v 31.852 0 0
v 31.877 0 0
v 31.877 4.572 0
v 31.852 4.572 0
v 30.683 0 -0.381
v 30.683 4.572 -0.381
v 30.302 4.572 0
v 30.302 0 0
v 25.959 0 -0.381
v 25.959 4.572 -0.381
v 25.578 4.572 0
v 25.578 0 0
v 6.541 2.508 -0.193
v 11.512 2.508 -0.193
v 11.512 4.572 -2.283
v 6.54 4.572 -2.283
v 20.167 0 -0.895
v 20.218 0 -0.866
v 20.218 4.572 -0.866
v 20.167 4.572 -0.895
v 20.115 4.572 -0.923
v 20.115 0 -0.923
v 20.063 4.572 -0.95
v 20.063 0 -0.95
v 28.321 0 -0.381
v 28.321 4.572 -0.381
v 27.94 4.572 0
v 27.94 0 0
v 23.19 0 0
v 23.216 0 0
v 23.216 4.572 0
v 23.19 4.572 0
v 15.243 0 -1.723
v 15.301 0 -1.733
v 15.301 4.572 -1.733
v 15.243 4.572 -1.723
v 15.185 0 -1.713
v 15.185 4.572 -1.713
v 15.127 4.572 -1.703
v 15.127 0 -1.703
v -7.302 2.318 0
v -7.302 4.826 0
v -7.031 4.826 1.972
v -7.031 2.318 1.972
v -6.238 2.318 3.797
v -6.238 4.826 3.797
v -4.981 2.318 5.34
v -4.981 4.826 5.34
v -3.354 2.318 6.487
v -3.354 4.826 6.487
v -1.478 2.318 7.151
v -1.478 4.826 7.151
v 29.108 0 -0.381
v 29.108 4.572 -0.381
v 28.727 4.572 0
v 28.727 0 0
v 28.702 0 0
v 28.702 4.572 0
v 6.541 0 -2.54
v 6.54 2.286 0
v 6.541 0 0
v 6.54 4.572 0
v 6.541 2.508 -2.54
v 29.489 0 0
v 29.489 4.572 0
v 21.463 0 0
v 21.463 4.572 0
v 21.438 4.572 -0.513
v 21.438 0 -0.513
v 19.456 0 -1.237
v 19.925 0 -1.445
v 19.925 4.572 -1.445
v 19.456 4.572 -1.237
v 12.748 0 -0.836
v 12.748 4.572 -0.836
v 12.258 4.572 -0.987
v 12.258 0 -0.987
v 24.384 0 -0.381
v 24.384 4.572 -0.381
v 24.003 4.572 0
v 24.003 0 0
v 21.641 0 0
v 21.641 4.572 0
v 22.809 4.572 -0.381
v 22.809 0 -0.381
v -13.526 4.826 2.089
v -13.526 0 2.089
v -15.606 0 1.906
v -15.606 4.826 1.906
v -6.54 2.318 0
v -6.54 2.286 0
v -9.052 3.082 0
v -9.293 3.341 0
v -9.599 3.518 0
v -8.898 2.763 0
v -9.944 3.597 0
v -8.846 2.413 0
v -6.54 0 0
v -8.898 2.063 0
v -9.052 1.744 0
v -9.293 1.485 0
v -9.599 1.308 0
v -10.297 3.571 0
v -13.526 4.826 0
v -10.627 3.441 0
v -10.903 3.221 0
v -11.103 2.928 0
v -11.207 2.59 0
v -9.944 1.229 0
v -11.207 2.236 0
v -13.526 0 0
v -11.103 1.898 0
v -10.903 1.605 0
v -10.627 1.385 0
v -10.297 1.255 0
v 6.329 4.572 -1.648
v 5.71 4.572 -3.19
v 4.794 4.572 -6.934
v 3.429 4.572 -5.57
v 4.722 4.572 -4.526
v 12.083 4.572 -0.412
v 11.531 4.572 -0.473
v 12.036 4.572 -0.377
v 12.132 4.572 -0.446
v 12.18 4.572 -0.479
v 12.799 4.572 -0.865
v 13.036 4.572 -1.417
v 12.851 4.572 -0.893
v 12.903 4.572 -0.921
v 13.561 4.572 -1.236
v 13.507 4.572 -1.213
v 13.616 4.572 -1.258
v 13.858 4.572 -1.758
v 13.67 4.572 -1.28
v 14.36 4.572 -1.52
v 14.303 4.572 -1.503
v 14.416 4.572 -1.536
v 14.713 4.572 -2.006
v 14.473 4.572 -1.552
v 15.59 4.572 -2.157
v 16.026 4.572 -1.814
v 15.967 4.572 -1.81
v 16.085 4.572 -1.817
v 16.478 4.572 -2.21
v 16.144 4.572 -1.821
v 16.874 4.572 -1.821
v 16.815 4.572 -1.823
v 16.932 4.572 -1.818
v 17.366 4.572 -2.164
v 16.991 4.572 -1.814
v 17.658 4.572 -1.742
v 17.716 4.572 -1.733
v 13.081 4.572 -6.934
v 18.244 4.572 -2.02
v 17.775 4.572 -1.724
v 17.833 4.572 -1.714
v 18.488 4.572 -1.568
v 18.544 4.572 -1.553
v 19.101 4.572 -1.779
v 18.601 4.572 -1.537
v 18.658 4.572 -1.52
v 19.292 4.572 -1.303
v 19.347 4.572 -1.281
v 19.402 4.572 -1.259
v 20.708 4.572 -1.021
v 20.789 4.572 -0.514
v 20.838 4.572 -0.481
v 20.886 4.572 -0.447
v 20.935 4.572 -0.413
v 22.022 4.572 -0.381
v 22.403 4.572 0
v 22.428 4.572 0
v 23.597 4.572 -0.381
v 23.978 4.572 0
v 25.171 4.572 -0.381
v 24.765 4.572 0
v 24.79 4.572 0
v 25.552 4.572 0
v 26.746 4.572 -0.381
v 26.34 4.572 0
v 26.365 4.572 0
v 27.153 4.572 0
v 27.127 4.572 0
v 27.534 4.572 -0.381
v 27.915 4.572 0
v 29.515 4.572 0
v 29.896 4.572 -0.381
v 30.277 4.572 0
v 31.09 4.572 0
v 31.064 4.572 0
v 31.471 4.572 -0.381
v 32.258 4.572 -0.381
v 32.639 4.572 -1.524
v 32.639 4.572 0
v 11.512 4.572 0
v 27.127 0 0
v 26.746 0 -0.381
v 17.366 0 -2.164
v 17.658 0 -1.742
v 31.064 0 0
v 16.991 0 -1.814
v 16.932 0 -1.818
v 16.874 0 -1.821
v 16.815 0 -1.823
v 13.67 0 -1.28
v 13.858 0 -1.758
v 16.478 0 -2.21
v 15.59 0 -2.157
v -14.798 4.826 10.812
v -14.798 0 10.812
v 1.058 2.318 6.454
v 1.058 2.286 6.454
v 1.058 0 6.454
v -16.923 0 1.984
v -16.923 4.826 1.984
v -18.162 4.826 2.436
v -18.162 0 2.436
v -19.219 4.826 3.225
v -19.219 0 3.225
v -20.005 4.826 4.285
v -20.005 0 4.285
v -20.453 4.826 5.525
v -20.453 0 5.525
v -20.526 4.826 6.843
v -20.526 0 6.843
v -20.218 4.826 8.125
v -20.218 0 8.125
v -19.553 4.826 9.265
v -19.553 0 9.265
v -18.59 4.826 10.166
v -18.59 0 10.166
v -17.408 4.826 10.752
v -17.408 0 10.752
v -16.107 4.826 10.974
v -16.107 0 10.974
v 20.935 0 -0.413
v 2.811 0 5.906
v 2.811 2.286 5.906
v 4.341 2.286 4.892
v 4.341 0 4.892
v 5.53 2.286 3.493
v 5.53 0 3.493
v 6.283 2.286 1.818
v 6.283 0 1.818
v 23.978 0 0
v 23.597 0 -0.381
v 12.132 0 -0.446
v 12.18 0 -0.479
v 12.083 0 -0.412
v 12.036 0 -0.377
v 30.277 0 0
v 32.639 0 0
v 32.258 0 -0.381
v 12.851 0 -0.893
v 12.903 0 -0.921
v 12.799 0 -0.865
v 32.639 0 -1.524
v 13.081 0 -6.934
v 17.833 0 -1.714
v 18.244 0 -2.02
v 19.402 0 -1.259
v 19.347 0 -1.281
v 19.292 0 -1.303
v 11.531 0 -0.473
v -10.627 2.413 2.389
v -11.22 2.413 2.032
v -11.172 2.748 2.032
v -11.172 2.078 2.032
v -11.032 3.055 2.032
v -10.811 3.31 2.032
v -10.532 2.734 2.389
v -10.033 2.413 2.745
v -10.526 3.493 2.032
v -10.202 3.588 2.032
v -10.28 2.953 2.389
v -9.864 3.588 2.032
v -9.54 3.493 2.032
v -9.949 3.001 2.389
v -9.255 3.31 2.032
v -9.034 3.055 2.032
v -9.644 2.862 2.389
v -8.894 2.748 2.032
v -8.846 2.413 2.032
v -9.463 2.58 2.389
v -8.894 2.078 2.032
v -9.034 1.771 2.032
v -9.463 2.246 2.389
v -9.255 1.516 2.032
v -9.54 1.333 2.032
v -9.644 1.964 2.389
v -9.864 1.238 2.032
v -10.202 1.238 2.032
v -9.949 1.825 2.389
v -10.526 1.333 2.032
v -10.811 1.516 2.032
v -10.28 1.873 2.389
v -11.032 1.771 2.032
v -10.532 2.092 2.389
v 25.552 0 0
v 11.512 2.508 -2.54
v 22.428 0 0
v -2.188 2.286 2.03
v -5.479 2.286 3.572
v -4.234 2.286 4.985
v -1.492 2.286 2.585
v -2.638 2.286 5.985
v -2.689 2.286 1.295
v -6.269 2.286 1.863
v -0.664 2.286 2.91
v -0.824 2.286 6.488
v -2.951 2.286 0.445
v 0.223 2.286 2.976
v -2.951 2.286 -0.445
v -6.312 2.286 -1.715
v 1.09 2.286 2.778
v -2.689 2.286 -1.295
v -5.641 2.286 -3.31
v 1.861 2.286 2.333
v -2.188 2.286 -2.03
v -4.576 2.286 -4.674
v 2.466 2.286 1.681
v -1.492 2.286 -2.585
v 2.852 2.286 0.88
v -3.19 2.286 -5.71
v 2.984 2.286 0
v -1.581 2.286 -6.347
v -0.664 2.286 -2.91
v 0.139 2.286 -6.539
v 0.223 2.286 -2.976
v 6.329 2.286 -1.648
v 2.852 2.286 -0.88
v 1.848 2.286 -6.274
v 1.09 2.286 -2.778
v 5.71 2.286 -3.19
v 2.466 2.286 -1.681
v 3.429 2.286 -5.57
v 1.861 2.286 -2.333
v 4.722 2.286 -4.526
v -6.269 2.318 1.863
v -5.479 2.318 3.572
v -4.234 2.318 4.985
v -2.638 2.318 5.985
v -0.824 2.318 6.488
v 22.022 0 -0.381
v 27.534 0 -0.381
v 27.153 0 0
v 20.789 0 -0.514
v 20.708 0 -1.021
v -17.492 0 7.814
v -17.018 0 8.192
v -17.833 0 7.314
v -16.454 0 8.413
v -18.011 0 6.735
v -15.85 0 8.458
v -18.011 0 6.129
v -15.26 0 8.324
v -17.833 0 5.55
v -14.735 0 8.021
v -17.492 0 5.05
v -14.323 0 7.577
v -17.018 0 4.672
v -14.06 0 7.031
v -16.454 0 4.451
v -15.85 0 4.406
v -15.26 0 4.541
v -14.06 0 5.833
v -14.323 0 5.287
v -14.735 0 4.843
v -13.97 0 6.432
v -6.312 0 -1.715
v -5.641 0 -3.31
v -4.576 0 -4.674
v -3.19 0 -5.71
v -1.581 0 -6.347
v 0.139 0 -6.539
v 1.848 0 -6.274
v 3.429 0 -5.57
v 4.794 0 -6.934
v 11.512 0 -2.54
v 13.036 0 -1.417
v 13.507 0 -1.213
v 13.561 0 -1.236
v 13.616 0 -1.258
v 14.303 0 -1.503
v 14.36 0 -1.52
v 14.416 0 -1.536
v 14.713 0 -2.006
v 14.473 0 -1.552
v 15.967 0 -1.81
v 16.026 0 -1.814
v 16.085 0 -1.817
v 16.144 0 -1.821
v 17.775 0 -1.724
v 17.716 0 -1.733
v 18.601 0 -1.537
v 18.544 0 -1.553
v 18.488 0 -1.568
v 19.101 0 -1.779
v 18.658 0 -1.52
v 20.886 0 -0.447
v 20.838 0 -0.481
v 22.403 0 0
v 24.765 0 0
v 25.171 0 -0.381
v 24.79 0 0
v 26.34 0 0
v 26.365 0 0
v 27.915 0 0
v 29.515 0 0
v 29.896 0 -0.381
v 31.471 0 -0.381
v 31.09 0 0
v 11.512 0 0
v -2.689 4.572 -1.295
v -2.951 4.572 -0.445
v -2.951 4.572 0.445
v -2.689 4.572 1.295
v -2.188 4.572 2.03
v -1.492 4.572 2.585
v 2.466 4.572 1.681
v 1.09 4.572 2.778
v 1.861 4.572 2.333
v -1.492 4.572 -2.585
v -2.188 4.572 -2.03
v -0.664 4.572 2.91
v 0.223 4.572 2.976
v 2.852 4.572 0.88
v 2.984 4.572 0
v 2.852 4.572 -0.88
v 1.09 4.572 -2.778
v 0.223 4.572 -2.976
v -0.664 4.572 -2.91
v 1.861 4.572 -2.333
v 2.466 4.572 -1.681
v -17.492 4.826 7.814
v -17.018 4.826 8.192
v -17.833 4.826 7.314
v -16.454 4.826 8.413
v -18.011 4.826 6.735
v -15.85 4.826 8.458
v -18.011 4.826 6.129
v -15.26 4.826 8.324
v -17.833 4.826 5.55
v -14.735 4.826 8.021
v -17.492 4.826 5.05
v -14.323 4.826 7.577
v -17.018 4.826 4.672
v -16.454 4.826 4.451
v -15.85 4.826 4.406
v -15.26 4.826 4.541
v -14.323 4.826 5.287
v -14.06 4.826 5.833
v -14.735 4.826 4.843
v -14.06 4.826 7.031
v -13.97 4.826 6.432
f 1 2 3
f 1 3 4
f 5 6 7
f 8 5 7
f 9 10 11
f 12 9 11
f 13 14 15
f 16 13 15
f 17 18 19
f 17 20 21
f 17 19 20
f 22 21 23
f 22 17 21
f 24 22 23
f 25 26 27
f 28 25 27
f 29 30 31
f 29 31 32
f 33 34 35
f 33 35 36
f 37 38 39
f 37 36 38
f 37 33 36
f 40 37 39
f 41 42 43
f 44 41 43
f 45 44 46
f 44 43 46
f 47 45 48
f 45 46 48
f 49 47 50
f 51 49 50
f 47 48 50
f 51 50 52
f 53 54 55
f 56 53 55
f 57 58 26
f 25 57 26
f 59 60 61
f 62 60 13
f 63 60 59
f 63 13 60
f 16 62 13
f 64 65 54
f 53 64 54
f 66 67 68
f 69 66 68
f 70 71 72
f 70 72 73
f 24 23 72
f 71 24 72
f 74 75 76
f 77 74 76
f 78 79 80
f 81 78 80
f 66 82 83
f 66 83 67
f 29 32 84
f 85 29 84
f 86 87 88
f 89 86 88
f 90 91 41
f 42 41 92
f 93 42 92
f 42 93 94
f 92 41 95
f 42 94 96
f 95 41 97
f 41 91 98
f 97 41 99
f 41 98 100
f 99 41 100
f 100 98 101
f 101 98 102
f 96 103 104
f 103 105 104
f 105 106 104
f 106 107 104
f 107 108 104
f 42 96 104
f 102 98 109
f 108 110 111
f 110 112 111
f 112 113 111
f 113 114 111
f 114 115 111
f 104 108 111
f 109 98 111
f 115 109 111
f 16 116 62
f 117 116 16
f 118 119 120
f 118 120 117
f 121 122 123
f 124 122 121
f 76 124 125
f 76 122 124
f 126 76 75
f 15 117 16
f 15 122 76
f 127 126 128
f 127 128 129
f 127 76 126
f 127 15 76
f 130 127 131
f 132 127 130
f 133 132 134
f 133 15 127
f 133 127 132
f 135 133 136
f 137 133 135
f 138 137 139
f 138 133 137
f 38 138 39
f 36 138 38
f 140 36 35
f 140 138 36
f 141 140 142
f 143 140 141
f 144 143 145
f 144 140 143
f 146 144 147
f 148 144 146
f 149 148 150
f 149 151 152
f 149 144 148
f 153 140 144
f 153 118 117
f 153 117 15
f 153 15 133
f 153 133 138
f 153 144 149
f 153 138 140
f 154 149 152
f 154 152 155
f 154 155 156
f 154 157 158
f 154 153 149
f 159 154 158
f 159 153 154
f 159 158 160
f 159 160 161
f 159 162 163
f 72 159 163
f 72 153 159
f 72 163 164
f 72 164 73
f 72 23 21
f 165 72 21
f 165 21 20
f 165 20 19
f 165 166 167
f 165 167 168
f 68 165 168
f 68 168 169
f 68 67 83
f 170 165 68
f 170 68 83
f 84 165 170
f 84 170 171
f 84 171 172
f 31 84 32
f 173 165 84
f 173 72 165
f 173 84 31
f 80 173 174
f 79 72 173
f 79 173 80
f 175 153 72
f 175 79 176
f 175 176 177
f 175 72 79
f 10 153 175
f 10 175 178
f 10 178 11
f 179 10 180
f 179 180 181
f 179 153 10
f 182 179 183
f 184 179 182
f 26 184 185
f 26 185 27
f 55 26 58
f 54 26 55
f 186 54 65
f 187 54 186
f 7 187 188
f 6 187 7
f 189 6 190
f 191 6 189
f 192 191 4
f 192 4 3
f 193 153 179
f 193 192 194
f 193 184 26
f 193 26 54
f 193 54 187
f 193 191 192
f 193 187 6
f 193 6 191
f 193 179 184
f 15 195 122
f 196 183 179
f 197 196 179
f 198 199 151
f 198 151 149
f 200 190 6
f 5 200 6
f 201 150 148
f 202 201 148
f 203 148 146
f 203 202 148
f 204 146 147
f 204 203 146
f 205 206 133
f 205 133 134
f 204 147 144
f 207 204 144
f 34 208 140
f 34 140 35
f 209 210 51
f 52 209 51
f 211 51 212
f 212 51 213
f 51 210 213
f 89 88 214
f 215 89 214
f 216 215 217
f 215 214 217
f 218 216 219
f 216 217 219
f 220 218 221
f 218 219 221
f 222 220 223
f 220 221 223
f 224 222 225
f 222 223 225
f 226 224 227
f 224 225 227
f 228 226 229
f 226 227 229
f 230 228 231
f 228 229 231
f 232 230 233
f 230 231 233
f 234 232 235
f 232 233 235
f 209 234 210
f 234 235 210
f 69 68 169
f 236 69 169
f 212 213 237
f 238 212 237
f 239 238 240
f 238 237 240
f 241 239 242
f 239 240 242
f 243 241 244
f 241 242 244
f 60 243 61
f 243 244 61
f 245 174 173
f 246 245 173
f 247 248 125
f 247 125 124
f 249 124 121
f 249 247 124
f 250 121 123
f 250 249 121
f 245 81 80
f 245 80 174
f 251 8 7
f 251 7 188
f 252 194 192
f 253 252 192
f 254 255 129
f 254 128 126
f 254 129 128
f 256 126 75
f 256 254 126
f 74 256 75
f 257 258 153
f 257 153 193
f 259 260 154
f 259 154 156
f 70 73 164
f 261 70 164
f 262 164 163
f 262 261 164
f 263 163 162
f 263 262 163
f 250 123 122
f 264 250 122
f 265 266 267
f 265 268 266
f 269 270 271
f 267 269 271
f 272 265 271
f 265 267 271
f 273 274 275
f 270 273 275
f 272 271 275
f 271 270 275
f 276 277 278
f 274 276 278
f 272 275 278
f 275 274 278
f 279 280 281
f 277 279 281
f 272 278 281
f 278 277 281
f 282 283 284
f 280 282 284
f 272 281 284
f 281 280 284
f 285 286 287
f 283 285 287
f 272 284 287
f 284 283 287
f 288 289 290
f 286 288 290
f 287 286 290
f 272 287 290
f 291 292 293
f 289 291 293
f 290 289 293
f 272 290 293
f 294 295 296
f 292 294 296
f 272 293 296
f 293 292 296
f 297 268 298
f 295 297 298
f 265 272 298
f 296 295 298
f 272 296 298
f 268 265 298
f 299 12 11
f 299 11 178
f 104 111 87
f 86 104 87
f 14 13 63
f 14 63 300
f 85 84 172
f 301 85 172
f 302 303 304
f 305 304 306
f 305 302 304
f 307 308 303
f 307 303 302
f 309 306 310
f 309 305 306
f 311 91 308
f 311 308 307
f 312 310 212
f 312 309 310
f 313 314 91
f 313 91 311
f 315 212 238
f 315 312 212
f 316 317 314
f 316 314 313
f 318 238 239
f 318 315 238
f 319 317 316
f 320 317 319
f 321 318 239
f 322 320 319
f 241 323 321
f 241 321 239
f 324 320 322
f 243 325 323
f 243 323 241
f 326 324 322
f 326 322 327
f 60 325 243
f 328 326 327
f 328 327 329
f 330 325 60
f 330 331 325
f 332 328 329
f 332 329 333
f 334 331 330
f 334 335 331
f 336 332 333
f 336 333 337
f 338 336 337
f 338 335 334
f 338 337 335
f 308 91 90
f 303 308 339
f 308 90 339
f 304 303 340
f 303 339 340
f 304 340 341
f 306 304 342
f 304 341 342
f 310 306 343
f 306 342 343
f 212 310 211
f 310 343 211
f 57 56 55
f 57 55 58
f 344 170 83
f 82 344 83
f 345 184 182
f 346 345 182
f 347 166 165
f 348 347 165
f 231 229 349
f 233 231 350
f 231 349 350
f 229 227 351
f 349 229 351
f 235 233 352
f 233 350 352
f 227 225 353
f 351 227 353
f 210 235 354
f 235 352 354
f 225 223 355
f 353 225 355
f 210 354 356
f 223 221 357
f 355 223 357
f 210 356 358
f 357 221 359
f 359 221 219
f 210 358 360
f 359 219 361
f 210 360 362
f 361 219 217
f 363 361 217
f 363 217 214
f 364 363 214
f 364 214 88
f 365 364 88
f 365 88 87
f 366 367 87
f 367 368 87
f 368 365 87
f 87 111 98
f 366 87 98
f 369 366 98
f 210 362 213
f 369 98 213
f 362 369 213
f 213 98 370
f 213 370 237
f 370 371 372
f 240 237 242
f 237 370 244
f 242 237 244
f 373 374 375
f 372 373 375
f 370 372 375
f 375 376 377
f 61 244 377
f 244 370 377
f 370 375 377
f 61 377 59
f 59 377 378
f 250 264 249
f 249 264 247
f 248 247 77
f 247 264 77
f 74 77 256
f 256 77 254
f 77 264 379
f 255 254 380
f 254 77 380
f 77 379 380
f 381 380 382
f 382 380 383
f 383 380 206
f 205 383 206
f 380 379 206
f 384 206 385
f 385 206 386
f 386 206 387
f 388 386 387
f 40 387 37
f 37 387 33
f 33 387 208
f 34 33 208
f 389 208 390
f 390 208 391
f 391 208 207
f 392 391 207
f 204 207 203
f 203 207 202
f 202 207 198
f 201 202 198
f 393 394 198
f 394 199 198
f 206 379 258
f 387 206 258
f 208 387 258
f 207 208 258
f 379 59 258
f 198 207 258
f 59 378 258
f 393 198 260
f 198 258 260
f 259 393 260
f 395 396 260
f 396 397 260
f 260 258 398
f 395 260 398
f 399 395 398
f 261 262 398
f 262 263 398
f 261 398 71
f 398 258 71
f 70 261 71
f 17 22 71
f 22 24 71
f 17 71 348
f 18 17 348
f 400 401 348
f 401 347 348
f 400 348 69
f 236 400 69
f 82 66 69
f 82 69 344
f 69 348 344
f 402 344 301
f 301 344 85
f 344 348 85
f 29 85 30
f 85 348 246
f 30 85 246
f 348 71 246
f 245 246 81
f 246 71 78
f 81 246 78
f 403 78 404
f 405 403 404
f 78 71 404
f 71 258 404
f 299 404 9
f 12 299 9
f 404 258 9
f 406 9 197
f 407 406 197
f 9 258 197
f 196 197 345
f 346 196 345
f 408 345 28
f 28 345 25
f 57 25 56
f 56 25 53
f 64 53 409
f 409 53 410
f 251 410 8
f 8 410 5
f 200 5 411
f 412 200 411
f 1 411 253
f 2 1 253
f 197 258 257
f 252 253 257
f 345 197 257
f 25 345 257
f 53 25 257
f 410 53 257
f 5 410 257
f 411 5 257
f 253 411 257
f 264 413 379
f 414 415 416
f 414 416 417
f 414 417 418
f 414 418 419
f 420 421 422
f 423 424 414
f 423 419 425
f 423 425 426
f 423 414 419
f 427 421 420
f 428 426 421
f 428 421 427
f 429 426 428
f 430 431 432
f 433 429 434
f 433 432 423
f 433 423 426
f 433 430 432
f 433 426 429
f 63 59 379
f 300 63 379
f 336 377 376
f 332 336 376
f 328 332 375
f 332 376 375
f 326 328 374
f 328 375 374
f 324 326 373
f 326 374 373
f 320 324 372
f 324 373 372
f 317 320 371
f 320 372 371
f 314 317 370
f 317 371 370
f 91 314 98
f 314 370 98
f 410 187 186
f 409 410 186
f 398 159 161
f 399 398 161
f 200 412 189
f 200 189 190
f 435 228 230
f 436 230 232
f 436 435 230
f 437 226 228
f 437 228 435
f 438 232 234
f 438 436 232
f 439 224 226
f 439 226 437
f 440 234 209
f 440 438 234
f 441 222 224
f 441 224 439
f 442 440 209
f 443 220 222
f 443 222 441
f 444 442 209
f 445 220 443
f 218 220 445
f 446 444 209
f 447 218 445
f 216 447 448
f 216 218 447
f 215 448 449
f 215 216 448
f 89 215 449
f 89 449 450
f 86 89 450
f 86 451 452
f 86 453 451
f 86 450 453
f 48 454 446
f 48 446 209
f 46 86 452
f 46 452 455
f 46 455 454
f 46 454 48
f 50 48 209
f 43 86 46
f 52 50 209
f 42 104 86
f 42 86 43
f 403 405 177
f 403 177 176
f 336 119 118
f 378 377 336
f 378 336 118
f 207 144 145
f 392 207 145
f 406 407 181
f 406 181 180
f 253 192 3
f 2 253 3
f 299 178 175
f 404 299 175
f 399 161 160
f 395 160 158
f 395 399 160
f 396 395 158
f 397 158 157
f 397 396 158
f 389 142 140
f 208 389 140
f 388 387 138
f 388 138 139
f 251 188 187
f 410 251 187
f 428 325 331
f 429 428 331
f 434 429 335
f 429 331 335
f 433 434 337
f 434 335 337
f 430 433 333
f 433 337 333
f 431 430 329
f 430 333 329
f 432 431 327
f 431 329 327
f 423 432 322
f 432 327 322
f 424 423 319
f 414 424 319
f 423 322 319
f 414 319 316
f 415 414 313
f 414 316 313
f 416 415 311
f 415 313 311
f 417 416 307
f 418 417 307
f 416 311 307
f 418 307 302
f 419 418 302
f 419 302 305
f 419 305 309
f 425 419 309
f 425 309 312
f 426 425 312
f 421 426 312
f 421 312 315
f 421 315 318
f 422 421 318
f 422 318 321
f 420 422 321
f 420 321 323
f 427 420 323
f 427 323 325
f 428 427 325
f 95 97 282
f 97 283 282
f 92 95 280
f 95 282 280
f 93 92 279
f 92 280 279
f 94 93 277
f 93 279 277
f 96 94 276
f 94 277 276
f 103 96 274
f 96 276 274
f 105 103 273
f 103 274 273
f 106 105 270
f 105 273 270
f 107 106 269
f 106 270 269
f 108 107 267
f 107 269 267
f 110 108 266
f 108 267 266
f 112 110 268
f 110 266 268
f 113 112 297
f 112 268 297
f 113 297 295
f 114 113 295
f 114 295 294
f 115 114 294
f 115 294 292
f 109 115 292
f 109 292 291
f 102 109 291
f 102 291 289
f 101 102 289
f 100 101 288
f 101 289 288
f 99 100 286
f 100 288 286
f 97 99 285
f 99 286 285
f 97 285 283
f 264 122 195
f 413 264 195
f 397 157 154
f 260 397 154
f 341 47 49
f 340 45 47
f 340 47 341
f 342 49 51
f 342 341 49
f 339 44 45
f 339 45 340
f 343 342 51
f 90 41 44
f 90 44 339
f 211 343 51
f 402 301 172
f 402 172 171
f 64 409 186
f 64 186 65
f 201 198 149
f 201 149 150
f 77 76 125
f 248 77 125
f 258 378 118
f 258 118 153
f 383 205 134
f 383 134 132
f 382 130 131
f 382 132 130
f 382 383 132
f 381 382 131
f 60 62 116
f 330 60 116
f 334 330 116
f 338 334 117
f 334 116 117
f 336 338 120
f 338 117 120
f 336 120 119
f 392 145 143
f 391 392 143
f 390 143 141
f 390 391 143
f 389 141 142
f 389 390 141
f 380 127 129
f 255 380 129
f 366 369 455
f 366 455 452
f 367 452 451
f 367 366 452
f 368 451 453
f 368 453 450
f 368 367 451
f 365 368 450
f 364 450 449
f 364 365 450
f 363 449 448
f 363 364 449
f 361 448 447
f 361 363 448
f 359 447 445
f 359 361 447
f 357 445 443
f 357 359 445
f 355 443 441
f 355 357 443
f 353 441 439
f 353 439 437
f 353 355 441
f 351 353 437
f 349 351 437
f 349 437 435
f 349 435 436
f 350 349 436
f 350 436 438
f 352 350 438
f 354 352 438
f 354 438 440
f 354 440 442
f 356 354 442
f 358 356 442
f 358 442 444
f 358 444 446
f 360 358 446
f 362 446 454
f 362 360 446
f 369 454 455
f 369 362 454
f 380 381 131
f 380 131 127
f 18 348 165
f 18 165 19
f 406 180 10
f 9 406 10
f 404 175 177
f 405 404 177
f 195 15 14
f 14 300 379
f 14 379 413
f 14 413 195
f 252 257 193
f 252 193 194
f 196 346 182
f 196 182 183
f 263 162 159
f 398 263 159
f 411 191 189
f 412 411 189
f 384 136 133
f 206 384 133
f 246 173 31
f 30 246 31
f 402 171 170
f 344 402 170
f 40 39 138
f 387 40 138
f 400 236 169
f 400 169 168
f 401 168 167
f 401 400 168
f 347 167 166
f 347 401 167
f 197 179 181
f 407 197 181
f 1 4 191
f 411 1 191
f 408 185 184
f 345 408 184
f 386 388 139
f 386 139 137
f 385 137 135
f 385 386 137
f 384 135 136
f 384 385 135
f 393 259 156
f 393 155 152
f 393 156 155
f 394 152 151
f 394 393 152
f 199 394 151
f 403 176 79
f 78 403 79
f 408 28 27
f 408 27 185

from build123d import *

# Parameters (mm, degrees)
SKETCH1_R                        = 6.5405
SKETCH1_R_2                      = 2.9845
BOSS_EXTRUDE1_DEPTH              = 4.826
SKETCH2_R                        = 2.032
BOSS_EXTRUDE2_DEPTH              = 4.826
F_42_0_0935_DIAMETER_HOLE1_D     = 2.3749
F_42_0_0935_DIAMETER_HOLE1_DEPTH = 2.032
F_42_0_0935_DIAMETER_HOLE1_TIP   = 0.713491942
BOSS_EXTRUDE3_DEPTH              = 4.826
CUT_EXTRUDE1_DEPTH               = 2.50825
CUT_EXTRUDE2_DEPTH               = 5.826
LPATTERN1_COUNT                  = 14
LPATTERN1_PITCH                  = 0.7874
CUT_EXTRUDE3_DEPTH               = 5.826
CIRPATTERN1_COUNT                = 13
CIRPATTERN1_ANGLE                = 76.5
SKETCH13_W                       = 4.971607039
SKETCH13_H                       = 2.54
CUT_EXTRUDE5_DEPTH               = 2.50825
BOSS_EXTRUDE4_REACH              = 28.099
SKETCH15_W                       = 4.971607039
SKETCH15_H                       = 2.54
CUT_EXTRUDE6_DEPTH               = 2.50825
SKETCH16_R                       = 6.5405
CUT_EXTRUDE7_DEPTH               = 2.54
SKETCH18_R                       = 2.9845
BOSS_EXTRUDE5_DEPTH              = 4.572
CUT_EXTRUDE8_DEPTH               = 0.254
CUT_EXTRUDE9_REACH               = 34.057


with BuildPart() as part:
    # Sketch1 → Boss-Extrude1 (new body)
    with BuildSketch(Plane(origin=(0, 0, 0), x_dir=(1, 0, 0), z_dir=(0, 1, 0))):
        Circle(SKETCH1_R)
        Circle(SKETCH1_R_2, mode=Mode.SUBTRACT)
    extrude(amount=BOSS_EXTRUDE1_DEPTH)

    # Sketch2 → Boss-Extrude2 (add)
    with BuildSketch(Plane(origin=(0, 0, 0), x_dir=(1, 0, 0), z_dir=(0, 1, 0))):
        with BuildLine():
            Line((-6.5405, 0), (-13.5255, 0))
            Line((-13.5255, 0), (-13.5255, -2.088510966))
            Line((-13.5255, -2.088510966), (-15.606063552, -1.906485242))
            ThreePointArc((-15.606063552, -1.906485242), (-20.526278057, -6.842542927), (-14.798031619, -10.81247605))
            Line((-14.798031619, -10.81247605), (1.058408056, -6.454294124))
            ThreePointArc((1.058408056, -6.454294124), (-4.234124606, -4.985010438), (-6.5405, 0))
        make_face()
        with Locations((-16.002, -6.432059555)):
            Circle(SKETCH2_R, mode=Mode.SUBTRACT)
    extrude(amount=BOSS_EXTRUDE2_DEPTH)

    # #42 (0.0935) Diameter Hole1
    with Locations(Plane(origin=(0, 0, 0), x_dir=(-1, 0, 0), z_dir=(0, 0, -1))):
        with Locations((10.033, 2.413)):
            Hole(F_42_0_0935_DIAMETER_HOLE1_D / 2, depth=F_42_0_0935_DIAMETER_HOLE1_DEPTH)
            with Locations((0, 0, -(F_42_0_0935_DIAMETER_HOLE1_DEPTH + F_42_0_0935_DIAMETER_HOLE1_TIP / 2))):  # 118° drill point
                Cone(0, F_42_0_0935_DIAMETER_HOLE1_D / 2, F_42_0_0935_DIAMETER_HOLE1_TIP, mode=Mode.SUBTRACT)

    # Sketch8 → Boss-Extrude3 (add)
    with BuildSketch(Plane(origin=(0, 0, 0), x_dir=(1, 0, 0), z_dir=(0, 1, 0))):
        with BuildLine():
            Line((13.081, 6.9342), (32.639, 1.524))
            Line((32.639, 1.524), (32.639, 0))
            Line((32.639, 0), (21.463, 0))
            ThreePointArc((21.463, 0), (16.51, 1.829301337), (11.557, 0))
            Line((11.557, 0), (6.5405, 0))
            ThreePointArc((6.5405, 0), (5.709882431, 3.189887596), (3.429, 5.569569036))
            Line((3.429, 5.569569036), (4.793630964, 6.9342))
            Line((4.793630964, 6.9342), (13.081, 6.9342))
        make_face()
    extrude(amount=BOSS_EXTRUDE3_DEPTH)

    # Sketch9 → Cut-Extrude1 (cut)
    with BuildSketch(Plane(origin=(0, 4.826, 0), x_dir=(1, 0, 0), z_dir=(0, 1, 0))):
        with BuildLine():
            Line((-6.5405, 0), (-7.3025, 0))
            ThreePointArc((-7.3025, 0), (-5.662092509, -4.611639044), (-1.477860583, -7.151393874))
            Line((-1.477860583, -7.151393874), (1.058408056, -6.454294124))
            ThreePointArc((1.058408056, -6.454294124), (-4.234124606, -4.985010438), (-6.5405, 0))
        make_face()
    extrude(amount=-CUT_EXTRUDE1_DEPTH, mode=Mode.SUBTRACT)

    # Sketch10 → Cut-Extrude2 (cut, through all)
    with BuildSketch(Plane(origin=(0, 4.826, 0), x_dir=(1, 0, 0), z_dir=(0, 1, 0))):
        Polygon((32.639, 0), (32.258, 0.381), (31.877, 0), align=None)
    cut_extrude2 = extrude(amount=-CUT_EXTRUDE2_DEPTH, mode=Mode.SUBTRACT)

    # LPattern1: Cut-Extrude2 ×14
    with Locations(*[(-i * LPATTERN1_PITCH, 0, 0) for i in range(1, LPATTERN1_COUNT)]):
        add(cut_extrude2, mode=Mode.SUBTRACT)

    # Sketch11 → Cut-Extrude3 (cut, through all)
    with BuildSketch(Plane(origin=(0, 4.826, 0), x_dir=(1, 0, 0), z_dir=(0, 1, 0))):
        with BuildLine():
            Line((21.463, 0), (21.438001029, 0.512539145))
            Line((21.438001029, 0.512539145), (20.934572554, 0.413135452))
            ThreePointArc((20.934572554, 0.413135452), (21.203334313, 0.212384964), (21.463, 0))
        make_face()
    cut_extrude3 = extrude(amount=-CUT_EXTRUDE3_DEPTH, mode=Mode.SUBTRACT)

    # CirPattern1: Cut-Extrude3 ×13 about axis
    cirpattern1_axis = Axis((16.51, 0, 5.790698663), (0, 1, 0))
    for i in range(1, CIRPATTERN1_COUNT):
        add(cut_extrude3.rotate(cirpattern1_axis, i * CIRPATTERN1_ANGLE / (CIRPATTERN1_COUNT - 1)), mode=Mode.SUBTRACT)

    # Sketch13 → Cut-Extrude5 (cut)
    with BuildSketch(Plane(origin=(0, 4.826, 0), x_dir=(1, 0, 0), z_dir=(0, 1, 0))):
        with Locations((9.02630352, 1.27)):
            Rectangle(SKETCH13_W, SKETCH13_H)
    extrude(amount=-CUT_EXTRUDE5_DEPTH, mode=Mode.SUBTRACT)

    # Sketch14 → Boss-Extrude4 (add, up to next)
    with BuildSketch(Plane(origin=(6.5405, 0, 0), x_dir=(0, 0, -1), z_dir=(1, 0, 0)), mode=Mode.PRIVATE) as boss_extrude4_sk1:
        Polygon((0, 2.31775), (2.54, 4.826), (2.54, 2.31775), align=None)
    boss_extrude4_tool1 = extrude(boss_extrude4_sk1.sketch, amount=BOSS_EXTRUDE4_REACH, mode=Mode.PRIVATE) - part.part
    add(boss_extrude4_tool1.solids().sort_by_distance((6.5405, 3.153833, -1.693333))[0])

    # Sketch15 → Cut-Extrude6 (cut)
    with BuildSketch(Plane.XZ):
        with Locations((9.02630352, -1.27)):
            Rectangle(SKETCH15_W, SKETCH15_H)
    extrude(amount=-CUT_EXTRUDE6_DEPTH, mode=Mode.SUBTRACT)

    # Sketch16 → Cut-Extrude7 (cut)
    with BuildSketch(Plane(origin=(0, 4.826, 0), x_dir=(1, 0, 0), z_dir=(0, 1, 0))):
        Circle(SKETCH16_R)
    extrude(amount=-CUT_EXTRUDE7_DEPTH, mode=Mode.SUBTRACT)

    # Sketch18 → Boss-Extrude5 (add)
    with BuildSketch(Plane(origin=(0, 0, 0), x_dir=(1, 0, 0), z_dir=(0, 1, 0))):
        Circle(SKETCH18_R)
    extrude(amount=BOSS_EXTRUDE5_DEPTH)

    # Sketch19 → Cut-Extrude8 (cut)
    with BuildSketch(Plane(origin=(0, 4.826, 0), x_dir=(1, 0, 0), z_dir=(0, 1, 0))):
        with BuildLine():
            Line((6.5405, 0), (6.5405, 2.54))
            Line((6.5405, 2.54), (11.512107039, 2.54))
            Line((11.512107039, 2.54), (11.512107039, 0))
            Line((11.512107039, 0), (11.531340148, 0.472602949))
            Line((11.531340148, 0.472602949), (12.03555369, 0.377261309))
            ThreePointArc((12.03555369, 0.377261309), (12.10743347, 0.428771407), (12.179906178, 0.479443879))
            Line((12.179906178, 0.479443879), (12.257573507, 0.986680619))
            Line((12.257573507, 0.986680619), (12.748082937, 0.835943022))
            ThreePointArc((12.748082937, 0.835943022), (12.825237685, 0.879153411), (12.90288869, 0.921465519))
            Line((12.90288869, 0.921465519), (13.036396947, 1.416941925))
            Line((13.036396947, 1.416941925), (13.507136098, 1.212672553))
            ThreePointArc((13.507136098, 1.212672553), (13.588611636, 1.247048848), (13.67048062, 1.280477314))
            Line((13.67048062, 1.280477314), (13.8581787, 1.758065792))
            Line((13.8581787, 1.758065792), (14.303325905, 1.502790861))
            ThreePointArc((14.303325905, 1.502790861), (14.388114618, 1.527907928), (14.473189102, 1.55203934))
            Line((14.473189102, 1.55203934), (14.712755728, 2.005833517))
            Line((14.712755728, 2.005833517), (15.126805817, 1.702710031))
            ThreePointArc((15.126805817, 1.702710031), (15.213859118, 1.718257244), (15.301086979, 1.732793167))
            Line((15.301086979, 1.732793167), (15.589559413, 2.157180937))
            Line((15.589559413, 2.157180937), (15.967391797, 1.809957647))
            ThreePointArc((15.967391797, 1.809957647), (16.05563309, 1.815742734), (16.143935576, 1.8205034))
            Line((16.143935576, 1.8205034), (16.477746256, 2.210236326))
            Line((16.477746256, 2.210236326), (16.814688254, 1.82320737))
            ThreePointArc((16.814688254, 1.82320737), (16.903026252, 1.819158785), (16.991311318, 1.81408532))
            Line((16.991311318, 1.81408532), (17.366331983, 2.164343546))
            Line((17.366331983, 2.164343546), (17.658216609, 1.742295339))
            ThreePointArc((17.658216609, 1.742295339), (17.745558829, 1.728463151), (17.832734648, 1.713618299))
            Line((17.832734648, 1.713618299), (18.244327388, 2.020070154))
            Line((18.244327388, 2.020070154), (18.487544881, 1.568222199))
            ThreePointArc((18.487544881, 1.568222199), (18.572811157, 1.544777473), (18.657799617, 1.52034482))
            Line((18.657799617, 1.52034482), (19.100874234, 1.779200392))
            Line((19.100874234, 1.779200392), (19.292416706, 1.303140726))
            ThreePointArc((19.292416706, 1.303140726), (19.374552542, 1.270373405), (19.456302586, 1.236655112))
            Line((19.456302586, 1.236655112), (19.925379542, 1.444713114))
            Line((19.925379542, 1.444713114), (20.062878172, 0.950329204))
            ThreePointArc((20.062878172, 0.950329204), (20.140867788, 0.908644522), (20.218368406, 0.866057587))
            Line((20.218368406, 0.866057587), (20.707646593, 1.02074495))
            Line((20.707646593, 1.02074495), (20.789400924, 0.514150878))
            ThreePointArc((20.789400924, 0.514150878), (20.862279817, 0.464064354), (20.934572554, 0.413135452))
            Line((20.934572554, 0.413135452), (21.438001029, 0.512539145))
            Line((21.438001029, 0.512539145), (21.463, 0))
            Line((21.463, 0), (21.6408, 0))
            Line((21.6408, 0), (22.0218, 0.381))
            Line((22.0218, 0.381), (22.4028, 0))
            Line((22.4028, 0), (22.4282, 0))
            Line((22.4282, 0), (22.8092, 0.381))
            Line((22.8092, 0.381), (23.1902, 0))
            Line((23.1902, 0), (23.2156, 0))
            Line((23.2156, 0), (23.5966, 0.381))
            Line((23.5966, 0.381), (23.9776, 0))
            Line((23.9776, 0), (24.003, 0))
            Line((24.003, 0), (24.384, 0.381))
            Line((24.384, 0.381), (24.765, 0))
            Line((24.765, 0), (24.7904, 0))
            Line((24.7904, 0), (25.1714, 0.381))
            Line((25.1714, 0.381), (25.5524, 0))
            Line((25.5524, 0), (25.5778, 0))
            Line((25.5778, 0), (25.9588, 0.381))
            Line((25.9588, 0.381), (26.3398, 0))
            Line((26.3398, 0), (26.3652, 0))
            Line((26.3652, 0), (26.7462, 0.381))
            Line((26.7462, 0.381), (27.1272, 0))
            Line((27.1272, 0), (27.1526, 0))
            Line((27.1526, 0), (27.5336, 0.381))
            Line((27.5336, 0.381), (27.9146, 0))
            Line((27.9146, 0), (27.94, 0))
            Line((27.94, 0), (28.321, 0.381))
            Line((28.321, 0.381), (28.702, 0))
            Line((28.702, 0), (28.7274, 0))
            Line((28.7274, 0), (29.1084, 0.381))
            Line((29.1084, 0.381), (29.4894, 0))
            Line((29.4894, 0), (29.5148, 0))
            Line((29.5148, 0), (29.8958, 0.381))
            Line((29.8958, 0.381), (30.2768, 0))
            Line((30.2768, 0), (30.3022, 0))
            Line((30.3022, 0), (30.6832, 0.381))
            Line((30.6832, 0.381), (31.0642, 0))
            Line((31.0642, 0), (31.0896, 0))
            Line((31.0896, 0), (31.4706, 0.381))
            Line((31.4706, 0.381), (31.8516, 0))
            Line((31.8516, 0), (31.877, 0))
            Line((31.877, 0), (32.258, 0.381))
            Line((32.258, 0.381), (32.639, 0))
            Line((32.639, 0), (32.639, 1.524))
            Line((32.639, 1.524), (13.081, 6.9342))
            Line((13.081, 6.9342), (4.793630964, 6.9342))
            Line((4.793630964, 6.9342), (3.429, 5.569569036))
            ThreePointArc((3.429, 5.569569036), (5.709882431, 3.189887596), (6.5405, 0))
        make_face()
    extrude(amount=-CUT_EXTRUDE8_DEPTH, mode=Mode.SUBTRACT)

    # Sketch20 → Cut-Extrude9 (cut, up to next)
    with BuildSketch(Plane(origin=(11.512107039, 0, 0), x_dir=(0, 0, -1), z_dir=(1, 0, 0)), mode=Mode.PRIVATE) as cut_extrude9_sk1:
        Polygon((2.54, 4.826), (2.28278481, 4.572), (2.54, 4.572), align=None)
    cut_extrude9_tool1 = extrude(cut_extrude9_sk1.sketch, amount=-CUT_EXTRUDE9_REACH, mode=Mode.PRIVATE) & part.part
    add(cut_extrude9_tool1.solids().sort_by_distance((11.512107, 4.656667, -2.454262))[0], mode=Mode.SUBTRACT)


solid = part.part
